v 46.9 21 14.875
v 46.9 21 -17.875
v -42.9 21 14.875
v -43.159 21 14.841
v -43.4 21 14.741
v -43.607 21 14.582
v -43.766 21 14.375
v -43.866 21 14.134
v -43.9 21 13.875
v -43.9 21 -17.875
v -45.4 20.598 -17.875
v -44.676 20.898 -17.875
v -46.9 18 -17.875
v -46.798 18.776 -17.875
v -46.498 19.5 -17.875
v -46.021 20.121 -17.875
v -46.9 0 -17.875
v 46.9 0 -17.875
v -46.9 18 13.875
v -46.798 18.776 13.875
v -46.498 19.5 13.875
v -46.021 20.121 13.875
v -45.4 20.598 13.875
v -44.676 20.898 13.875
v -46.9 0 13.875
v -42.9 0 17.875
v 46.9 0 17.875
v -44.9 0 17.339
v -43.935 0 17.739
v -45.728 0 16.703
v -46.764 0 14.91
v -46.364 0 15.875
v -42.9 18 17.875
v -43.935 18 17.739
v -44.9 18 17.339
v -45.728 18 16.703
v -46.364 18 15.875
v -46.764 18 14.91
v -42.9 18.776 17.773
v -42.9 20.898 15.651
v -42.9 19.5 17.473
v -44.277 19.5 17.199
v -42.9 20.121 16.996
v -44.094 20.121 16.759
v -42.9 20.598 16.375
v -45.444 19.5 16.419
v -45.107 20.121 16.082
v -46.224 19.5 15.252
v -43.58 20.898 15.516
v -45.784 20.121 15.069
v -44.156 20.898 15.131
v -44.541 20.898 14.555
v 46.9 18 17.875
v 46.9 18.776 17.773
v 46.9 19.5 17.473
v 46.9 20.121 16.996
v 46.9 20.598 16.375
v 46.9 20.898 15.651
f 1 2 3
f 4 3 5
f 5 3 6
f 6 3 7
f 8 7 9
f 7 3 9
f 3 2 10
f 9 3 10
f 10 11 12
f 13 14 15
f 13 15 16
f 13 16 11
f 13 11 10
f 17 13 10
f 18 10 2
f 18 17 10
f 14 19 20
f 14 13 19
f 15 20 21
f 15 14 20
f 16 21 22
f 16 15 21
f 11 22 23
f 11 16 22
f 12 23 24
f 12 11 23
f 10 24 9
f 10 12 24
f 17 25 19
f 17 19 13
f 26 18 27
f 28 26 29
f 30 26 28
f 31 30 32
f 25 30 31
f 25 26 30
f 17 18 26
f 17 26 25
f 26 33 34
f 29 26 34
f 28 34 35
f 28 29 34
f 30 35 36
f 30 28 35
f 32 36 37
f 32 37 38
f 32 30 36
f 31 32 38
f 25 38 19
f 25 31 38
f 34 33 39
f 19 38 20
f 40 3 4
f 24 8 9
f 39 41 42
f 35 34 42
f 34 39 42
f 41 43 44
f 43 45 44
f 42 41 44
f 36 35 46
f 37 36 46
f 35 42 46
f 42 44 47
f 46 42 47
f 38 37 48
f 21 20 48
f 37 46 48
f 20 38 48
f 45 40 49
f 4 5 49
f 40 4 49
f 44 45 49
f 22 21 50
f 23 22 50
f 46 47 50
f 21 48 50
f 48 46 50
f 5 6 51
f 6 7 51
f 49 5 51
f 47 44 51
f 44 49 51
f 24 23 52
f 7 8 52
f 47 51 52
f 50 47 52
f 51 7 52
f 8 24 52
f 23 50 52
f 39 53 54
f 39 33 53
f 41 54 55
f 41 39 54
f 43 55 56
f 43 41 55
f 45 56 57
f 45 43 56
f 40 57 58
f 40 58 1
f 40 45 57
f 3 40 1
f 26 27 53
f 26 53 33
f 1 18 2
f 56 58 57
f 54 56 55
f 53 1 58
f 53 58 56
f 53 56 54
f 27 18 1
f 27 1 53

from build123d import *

# Parameters (mm, degrees)
BOSS_EXTRUDE1_DEPTH = 21
FILLET1_R           = 3


with BuildPart() as part:
    # Sketch1 → Boss-Extrude1 (new body)
    with BuildSketch(Plane(origin=(0, 0, 0), x_dir=(1, 0, 0), z_dir=(0, 1, 0))):
        with BuildLine():
            Line((-46.9, 17.875), (46.9, 17.875))
            Line((46.9, 17.875), (46.9, -17.875))
            Line((46.9, -17.875), (-42.9, -17.875))
            ThreePointArc((-42.9, -17.875), (-45.728427125, -16.703427125), (-46.9, -13.875))
            Line((-46.9, -13.875), (-46.9, 17.875))
        make_face()
    extrude(amount=BOSS_EXTRUDE1_DEPTH)

    # Fillet1
    fillet1_edges = [part.edges().sort_by_distance(p)[0] for p in [
        (-46.9, 21, -2),
        (-45.728427125, 21, 16.703427125),
        (2, 21, 17.875),
    ]]
    fillet(fillet1_edges, radius=FILLET1_R)


solid = part.part
